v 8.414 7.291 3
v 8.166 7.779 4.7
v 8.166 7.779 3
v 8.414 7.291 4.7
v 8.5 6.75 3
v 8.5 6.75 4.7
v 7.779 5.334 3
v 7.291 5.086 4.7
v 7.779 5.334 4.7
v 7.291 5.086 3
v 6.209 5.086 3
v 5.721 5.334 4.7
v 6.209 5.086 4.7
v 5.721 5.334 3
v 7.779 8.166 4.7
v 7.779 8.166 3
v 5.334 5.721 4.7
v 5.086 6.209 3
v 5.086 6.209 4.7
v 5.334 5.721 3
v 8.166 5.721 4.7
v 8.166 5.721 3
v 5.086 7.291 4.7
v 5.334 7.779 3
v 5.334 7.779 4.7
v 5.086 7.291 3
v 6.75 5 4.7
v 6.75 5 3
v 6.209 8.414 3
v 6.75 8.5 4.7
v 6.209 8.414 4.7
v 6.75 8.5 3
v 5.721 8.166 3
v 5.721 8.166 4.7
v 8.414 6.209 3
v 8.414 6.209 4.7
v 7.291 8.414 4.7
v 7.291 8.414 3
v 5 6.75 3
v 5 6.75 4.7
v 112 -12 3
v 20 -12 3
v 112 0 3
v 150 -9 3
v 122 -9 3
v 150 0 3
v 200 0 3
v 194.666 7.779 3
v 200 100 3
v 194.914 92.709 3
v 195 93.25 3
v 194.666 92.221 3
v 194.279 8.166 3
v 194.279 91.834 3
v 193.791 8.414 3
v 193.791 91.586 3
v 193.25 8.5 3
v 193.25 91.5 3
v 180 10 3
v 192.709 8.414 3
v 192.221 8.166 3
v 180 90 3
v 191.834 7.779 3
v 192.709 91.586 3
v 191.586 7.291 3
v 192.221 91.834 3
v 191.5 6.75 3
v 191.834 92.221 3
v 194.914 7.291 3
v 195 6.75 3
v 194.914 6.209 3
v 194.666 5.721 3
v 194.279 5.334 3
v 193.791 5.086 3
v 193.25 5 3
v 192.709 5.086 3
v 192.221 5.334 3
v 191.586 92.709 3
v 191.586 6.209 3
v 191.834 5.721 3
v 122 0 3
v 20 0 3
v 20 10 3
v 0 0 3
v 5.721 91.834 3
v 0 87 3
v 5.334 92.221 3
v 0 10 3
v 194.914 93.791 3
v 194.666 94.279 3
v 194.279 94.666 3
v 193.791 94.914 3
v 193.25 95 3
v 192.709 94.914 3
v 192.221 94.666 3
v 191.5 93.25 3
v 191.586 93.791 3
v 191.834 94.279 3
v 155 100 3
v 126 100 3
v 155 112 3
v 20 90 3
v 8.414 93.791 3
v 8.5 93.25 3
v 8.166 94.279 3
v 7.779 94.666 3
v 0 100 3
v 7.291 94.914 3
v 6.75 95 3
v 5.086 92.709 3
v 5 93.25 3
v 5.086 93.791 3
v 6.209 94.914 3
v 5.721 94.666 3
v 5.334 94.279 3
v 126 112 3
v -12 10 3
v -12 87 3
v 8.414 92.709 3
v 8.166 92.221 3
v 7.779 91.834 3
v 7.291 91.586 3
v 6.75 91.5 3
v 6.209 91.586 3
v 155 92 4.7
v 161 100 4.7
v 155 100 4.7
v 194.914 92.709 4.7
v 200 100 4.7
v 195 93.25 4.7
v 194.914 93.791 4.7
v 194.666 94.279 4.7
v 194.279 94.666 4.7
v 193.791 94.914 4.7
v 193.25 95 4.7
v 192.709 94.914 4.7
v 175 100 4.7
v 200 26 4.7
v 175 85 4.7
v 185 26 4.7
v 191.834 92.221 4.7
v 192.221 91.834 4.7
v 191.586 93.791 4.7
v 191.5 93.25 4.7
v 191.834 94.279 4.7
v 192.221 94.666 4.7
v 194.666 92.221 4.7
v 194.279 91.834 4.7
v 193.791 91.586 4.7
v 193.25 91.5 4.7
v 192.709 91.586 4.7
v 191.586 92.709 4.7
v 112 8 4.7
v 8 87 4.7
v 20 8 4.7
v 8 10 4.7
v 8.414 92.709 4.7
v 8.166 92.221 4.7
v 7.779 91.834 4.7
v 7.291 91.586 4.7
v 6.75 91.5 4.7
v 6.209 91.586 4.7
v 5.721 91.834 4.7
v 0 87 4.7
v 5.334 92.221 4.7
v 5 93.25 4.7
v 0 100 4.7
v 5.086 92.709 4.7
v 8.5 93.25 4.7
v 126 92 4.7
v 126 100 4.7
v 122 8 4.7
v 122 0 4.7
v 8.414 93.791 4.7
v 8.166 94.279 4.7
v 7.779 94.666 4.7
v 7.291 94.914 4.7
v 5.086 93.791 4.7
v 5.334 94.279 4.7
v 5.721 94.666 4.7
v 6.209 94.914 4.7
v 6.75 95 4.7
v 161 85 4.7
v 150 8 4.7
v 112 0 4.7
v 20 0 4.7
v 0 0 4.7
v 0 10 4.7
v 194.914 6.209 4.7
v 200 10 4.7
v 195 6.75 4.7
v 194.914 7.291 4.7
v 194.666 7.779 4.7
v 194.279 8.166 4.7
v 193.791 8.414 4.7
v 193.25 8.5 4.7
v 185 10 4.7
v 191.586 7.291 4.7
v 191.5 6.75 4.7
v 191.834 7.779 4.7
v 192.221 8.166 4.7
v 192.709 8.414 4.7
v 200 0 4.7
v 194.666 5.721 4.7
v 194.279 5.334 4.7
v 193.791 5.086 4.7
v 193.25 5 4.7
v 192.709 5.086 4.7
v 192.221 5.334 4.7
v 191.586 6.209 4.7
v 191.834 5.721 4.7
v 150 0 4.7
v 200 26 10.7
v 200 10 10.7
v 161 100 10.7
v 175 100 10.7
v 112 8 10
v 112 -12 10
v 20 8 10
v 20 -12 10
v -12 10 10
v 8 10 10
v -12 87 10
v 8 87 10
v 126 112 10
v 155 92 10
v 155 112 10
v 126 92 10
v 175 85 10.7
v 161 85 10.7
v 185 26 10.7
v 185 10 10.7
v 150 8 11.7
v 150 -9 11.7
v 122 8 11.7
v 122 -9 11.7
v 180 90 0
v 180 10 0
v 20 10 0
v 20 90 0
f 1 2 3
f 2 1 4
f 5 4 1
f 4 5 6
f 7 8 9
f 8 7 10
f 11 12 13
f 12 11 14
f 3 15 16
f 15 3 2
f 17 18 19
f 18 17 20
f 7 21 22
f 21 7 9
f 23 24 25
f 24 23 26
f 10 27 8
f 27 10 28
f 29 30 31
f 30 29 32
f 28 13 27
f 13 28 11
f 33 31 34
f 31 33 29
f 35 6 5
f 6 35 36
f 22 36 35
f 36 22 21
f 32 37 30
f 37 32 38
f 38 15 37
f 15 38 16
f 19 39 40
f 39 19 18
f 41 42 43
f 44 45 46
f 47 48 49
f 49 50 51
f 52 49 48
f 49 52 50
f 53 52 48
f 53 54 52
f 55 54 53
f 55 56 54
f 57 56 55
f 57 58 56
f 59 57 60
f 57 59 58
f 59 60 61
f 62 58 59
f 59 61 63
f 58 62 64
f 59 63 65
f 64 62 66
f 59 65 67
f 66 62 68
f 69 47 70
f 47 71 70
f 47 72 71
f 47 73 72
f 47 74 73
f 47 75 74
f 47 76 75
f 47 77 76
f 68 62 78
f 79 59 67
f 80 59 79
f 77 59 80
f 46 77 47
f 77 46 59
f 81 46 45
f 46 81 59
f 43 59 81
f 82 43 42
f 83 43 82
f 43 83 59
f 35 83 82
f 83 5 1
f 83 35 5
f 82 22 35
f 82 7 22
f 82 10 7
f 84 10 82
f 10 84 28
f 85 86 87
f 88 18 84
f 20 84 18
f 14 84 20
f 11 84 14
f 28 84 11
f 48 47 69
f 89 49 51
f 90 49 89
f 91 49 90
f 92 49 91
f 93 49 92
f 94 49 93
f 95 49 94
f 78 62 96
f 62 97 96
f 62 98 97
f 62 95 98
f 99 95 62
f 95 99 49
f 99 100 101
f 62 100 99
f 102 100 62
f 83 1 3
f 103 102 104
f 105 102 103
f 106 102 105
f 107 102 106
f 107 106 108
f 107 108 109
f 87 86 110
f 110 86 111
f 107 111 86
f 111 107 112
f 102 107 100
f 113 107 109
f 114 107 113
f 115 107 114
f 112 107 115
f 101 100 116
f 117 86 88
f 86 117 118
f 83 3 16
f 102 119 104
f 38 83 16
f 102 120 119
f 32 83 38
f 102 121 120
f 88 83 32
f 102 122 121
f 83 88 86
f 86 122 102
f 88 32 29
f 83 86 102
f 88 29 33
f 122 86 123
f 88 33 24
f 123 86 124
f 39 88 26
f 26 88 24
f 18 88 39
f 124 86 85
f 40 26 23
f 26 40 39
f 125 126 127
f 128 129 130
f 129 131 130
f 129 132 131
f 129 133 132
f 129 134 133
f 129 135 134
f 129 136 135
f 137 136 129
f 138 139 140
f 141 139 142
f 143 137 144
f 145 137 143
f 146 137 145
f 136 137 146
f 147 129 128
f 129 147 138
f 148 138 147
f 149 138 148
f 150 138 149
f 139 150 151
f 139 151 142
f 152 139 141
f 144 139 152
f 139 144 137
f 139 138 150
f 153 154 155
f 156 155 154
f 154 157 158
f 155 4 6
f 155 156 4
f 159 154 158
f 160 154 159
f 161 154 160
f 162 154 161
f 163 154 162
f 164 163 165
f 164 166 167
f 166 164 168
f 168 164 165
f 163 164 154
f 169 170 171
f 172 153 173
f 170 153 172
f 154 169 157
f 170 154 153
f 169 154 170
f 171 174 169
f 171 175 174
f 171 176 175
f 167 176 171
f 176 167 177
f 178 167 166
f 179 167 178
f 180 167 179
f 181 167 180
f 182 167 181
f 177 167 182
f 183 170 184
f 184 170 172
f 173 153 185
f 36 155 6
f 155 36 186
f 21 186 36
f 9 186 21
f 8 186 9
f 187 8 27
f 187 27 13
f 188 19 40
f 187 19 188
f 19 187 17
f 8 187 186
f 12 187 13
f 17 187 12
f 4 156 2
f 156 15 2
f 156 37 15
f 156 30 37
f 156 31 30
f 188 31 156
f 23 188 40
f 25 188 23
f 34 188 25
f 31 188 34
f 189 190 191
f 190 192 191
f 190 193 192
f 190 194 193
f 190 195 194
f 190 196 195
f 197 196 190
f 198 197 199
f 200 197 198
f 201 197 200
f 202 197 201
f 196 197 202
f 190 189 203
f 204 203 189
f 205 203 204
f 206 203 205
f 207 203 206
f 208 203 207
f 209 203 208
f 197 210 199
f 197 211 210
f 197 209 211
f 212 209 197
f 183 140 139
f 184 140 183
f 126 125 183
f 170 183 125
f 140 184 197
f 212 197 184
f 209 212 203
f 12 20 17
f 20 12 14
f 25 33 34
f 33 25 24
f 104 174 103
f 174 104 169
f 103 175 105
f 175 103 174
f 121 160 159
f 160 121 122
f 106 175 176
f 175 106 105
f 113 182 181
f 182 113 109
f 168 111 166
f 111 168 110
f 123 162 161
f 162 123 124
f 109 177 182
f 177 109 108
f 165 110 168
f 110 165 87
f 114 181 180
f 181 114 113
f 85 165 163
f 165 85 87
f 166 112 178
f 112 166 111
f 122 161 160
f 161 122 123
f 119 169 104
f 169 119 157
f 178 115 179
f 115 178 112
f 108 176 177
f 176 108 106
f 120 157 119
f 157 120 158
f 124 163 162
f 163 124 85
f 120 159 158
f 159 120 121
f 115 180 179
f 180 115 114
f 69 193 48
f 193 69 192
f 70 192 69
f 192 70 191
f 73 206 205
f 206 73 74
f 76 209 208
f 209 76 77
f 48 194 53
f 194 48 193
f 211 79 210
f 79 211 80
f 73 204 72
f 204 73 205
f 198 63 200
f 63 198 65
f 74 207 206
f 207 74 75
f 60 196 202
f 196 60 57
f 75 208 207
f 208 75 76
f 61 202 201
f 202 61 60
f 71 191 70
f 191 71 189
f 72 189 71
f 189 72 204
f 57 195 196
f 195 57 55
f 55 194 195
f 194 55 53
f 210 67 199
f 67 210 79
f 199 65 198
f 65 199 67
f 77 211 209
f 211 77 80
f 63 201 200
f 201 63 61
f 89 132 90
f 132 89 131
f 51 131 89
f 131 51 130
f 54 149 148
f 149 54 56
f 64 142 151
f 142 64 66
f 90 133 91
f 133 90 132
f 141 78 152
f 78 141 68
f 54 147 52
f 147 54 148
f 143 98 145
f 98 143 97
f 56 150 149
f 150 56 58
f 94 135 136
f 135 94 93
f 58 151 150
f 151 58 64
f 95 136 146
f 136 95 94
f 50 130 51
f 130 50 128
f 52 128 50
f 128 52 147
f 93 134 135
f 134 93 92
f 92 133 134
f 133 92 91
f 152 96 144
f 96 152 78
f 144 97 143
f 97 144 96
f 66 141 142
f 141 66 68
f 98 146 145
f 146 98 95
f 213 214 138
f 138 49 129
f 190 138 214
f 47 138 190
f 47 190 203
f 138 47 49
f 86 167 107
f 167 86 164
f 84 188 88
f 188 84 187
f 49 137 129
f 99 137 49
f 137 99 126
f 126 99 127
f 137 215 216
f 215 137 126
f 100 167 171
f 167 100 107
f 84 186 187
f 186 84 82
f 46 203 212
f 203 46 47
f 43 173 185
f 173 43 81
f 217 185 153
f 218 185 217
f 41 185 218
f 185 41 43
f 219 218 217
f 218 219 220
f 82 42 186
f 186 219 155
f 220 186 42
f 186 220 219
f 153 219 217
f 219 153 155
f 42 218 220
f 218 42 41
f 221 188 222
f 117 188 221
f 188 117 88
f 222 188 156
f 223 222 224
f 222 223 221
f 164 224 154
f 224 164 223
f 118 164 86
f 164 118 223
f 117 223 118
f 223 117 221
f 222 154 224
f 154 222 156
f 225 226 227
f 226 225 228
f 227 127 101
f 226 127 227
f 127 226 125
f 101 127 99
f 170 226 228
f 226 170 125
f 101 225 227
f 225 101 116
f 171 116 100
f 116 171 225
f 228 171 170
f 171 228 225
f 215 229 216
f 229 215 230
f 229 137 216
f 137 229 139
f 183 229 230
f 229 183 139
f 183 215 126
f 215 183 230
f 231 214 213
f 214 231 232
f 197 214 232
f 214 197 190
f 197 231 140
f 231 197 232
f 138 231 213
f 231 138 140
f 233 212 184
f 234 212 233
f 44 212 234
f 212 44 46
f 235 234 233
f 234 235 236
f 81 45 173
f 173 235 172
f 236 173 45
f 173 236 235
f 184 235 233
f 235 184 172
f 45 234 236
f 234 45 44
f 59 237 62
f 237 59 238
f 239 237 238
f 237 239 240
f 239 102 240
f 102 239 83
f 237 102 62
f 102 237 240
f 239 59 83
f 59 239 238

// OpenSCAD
// -------------- Measurements -----------------
groundClearance = 3;
mountingHoleDiameter = 3.5;
sixteenPinConnectorWidth = 28;
sixteenPinConnectorHeight = 8.7;
powerConnectorWidthLarge = 16;
powerConnectorWidthSmall = 14;
powerConnectorHeight = 7.7;
lemoWidth = 7.2;
lemoHeight = 7;
lemoRow1Width = 92;
lemoRow2Width = 77;
lemoRow3Width = 29;
boardThickness = 1.7;
maxHeight = 17.4;
boardDepth = 100;
boardWidth = 200;

mountingHoleDistanceLeftRight = mountingHoleDiameter/2 + 5;
mountingHoleDistanceTopBottom = mountingHoleDistanceLeftRight;
lemoRow1DistanceLeft = 20;
lemoRow2DistanceBottom = 10;
lemoRow3DistanceRight = 45;
powerConnectorSmallDistanceRight = 25;
powerConnectorLargeDistanceBottom = 10;
sixteenPinConnectorDistanceRight = 50;

// ------------- Print Settings ----------------



// ---------------- Modules --------------------

module board() {

  translate([0, 0, groundClearance]) {
    
    difference() {

      // actual board
      color("#20C080") {
        cube([boardWidth, boardDepth, boardThickness], center=false);
      }

      // mounting holes
      color("black") {

        // bottom left
        translate([mountingHoleDistanceLeftRight, mountingHoleDistanceTopBottom, 0])
          holePuncher(mountingHoleDiameter, boardThickness);
        // top left
        translate([mountingHoleDistanceLeftRight, boardDepth - mountingHoleDistanceTopBottom, 0])
          holePuncher(mountingHoleDiameter, boardThickness);
        // bottom right
        translate([boardWidth - mountingHoleDistanceLeftRight, mountingHoleDistanceTopBottom, 0])
          holePuncher(mountingHoleDiameter, boardThickness);
        // top right
        translate([boardWidth - mountingHoleDistanceLeftRight, boardDepth - mountingHoleDistanceTopBottom, 0])
          holePuncher(mountingHoleDiameter, boardThickness);

      }

    }

    // ground clearance
    translate([(boardWidth * 0.2)/2, (boardDepth * 0.2)/2, -groundClearance])
      cube([boardWidth * .80, boardDepth * .80, groundClearance], center=false);

    // lemo rows
    color("lightgray") {

      // row 1 (bottom)
      translate([lemoRow1DistanceLeft, 0, 0])
        lemoRow(lemoRow1Width);

      // row 2 (left)
      translate([0, lemoRow2Width + lemoRow2DistanceBottom, 0])
        rotate([0, 0, -90])
          lemoRow(lemoRow2Width);

      // row 3 (top)
      translate([boardWidth - lemoRow3DistanceRight, boardDepth, 0])
        rotate([0, 0, 180])
          lemoRow(lemoRow3Width);
      
    }

    // 16-pin & power connectors
    color("#202020") {

      // power connector (small)
      translate([boardWidth - powerConnectorSmallDistanceRight, boardDepth, 0])
        rotate([0, 0, 180])
          powerConnector(powerConnectorWidthSmall);
      
      // power connector (large)
      translate([boardWidth, powerConnectorLargeDistanceBottom, 0])
        rotate([0, 0, 90])
          powerConnector(powerConnectorWidthLarge);

      // 16-pin connector
      translate([boardWidth - sixteenPinConnectorWidth - sixteenPinConnectorDistanceRight, 0, 0])
        sixteenPinConnector();
      
    }
       
  }

}

module holePuncher(diameter, height) {
  cylinder(d=diameter, h=height, center=false, $fn=20);
}

module lemoRow(width) {
  translate([0, -12, 0])
    cube([width, 20, lemoHeight]);
}

module powerConnector(width) {
  cube([width, 15, powerConnectorHeight]);
}

module sixteenPinConnector() {
  translate([0, -9, 0])
    cube([sixteenPinConnectorWidth, 17, sixteenPinConnectorHeight]);
}

board();
